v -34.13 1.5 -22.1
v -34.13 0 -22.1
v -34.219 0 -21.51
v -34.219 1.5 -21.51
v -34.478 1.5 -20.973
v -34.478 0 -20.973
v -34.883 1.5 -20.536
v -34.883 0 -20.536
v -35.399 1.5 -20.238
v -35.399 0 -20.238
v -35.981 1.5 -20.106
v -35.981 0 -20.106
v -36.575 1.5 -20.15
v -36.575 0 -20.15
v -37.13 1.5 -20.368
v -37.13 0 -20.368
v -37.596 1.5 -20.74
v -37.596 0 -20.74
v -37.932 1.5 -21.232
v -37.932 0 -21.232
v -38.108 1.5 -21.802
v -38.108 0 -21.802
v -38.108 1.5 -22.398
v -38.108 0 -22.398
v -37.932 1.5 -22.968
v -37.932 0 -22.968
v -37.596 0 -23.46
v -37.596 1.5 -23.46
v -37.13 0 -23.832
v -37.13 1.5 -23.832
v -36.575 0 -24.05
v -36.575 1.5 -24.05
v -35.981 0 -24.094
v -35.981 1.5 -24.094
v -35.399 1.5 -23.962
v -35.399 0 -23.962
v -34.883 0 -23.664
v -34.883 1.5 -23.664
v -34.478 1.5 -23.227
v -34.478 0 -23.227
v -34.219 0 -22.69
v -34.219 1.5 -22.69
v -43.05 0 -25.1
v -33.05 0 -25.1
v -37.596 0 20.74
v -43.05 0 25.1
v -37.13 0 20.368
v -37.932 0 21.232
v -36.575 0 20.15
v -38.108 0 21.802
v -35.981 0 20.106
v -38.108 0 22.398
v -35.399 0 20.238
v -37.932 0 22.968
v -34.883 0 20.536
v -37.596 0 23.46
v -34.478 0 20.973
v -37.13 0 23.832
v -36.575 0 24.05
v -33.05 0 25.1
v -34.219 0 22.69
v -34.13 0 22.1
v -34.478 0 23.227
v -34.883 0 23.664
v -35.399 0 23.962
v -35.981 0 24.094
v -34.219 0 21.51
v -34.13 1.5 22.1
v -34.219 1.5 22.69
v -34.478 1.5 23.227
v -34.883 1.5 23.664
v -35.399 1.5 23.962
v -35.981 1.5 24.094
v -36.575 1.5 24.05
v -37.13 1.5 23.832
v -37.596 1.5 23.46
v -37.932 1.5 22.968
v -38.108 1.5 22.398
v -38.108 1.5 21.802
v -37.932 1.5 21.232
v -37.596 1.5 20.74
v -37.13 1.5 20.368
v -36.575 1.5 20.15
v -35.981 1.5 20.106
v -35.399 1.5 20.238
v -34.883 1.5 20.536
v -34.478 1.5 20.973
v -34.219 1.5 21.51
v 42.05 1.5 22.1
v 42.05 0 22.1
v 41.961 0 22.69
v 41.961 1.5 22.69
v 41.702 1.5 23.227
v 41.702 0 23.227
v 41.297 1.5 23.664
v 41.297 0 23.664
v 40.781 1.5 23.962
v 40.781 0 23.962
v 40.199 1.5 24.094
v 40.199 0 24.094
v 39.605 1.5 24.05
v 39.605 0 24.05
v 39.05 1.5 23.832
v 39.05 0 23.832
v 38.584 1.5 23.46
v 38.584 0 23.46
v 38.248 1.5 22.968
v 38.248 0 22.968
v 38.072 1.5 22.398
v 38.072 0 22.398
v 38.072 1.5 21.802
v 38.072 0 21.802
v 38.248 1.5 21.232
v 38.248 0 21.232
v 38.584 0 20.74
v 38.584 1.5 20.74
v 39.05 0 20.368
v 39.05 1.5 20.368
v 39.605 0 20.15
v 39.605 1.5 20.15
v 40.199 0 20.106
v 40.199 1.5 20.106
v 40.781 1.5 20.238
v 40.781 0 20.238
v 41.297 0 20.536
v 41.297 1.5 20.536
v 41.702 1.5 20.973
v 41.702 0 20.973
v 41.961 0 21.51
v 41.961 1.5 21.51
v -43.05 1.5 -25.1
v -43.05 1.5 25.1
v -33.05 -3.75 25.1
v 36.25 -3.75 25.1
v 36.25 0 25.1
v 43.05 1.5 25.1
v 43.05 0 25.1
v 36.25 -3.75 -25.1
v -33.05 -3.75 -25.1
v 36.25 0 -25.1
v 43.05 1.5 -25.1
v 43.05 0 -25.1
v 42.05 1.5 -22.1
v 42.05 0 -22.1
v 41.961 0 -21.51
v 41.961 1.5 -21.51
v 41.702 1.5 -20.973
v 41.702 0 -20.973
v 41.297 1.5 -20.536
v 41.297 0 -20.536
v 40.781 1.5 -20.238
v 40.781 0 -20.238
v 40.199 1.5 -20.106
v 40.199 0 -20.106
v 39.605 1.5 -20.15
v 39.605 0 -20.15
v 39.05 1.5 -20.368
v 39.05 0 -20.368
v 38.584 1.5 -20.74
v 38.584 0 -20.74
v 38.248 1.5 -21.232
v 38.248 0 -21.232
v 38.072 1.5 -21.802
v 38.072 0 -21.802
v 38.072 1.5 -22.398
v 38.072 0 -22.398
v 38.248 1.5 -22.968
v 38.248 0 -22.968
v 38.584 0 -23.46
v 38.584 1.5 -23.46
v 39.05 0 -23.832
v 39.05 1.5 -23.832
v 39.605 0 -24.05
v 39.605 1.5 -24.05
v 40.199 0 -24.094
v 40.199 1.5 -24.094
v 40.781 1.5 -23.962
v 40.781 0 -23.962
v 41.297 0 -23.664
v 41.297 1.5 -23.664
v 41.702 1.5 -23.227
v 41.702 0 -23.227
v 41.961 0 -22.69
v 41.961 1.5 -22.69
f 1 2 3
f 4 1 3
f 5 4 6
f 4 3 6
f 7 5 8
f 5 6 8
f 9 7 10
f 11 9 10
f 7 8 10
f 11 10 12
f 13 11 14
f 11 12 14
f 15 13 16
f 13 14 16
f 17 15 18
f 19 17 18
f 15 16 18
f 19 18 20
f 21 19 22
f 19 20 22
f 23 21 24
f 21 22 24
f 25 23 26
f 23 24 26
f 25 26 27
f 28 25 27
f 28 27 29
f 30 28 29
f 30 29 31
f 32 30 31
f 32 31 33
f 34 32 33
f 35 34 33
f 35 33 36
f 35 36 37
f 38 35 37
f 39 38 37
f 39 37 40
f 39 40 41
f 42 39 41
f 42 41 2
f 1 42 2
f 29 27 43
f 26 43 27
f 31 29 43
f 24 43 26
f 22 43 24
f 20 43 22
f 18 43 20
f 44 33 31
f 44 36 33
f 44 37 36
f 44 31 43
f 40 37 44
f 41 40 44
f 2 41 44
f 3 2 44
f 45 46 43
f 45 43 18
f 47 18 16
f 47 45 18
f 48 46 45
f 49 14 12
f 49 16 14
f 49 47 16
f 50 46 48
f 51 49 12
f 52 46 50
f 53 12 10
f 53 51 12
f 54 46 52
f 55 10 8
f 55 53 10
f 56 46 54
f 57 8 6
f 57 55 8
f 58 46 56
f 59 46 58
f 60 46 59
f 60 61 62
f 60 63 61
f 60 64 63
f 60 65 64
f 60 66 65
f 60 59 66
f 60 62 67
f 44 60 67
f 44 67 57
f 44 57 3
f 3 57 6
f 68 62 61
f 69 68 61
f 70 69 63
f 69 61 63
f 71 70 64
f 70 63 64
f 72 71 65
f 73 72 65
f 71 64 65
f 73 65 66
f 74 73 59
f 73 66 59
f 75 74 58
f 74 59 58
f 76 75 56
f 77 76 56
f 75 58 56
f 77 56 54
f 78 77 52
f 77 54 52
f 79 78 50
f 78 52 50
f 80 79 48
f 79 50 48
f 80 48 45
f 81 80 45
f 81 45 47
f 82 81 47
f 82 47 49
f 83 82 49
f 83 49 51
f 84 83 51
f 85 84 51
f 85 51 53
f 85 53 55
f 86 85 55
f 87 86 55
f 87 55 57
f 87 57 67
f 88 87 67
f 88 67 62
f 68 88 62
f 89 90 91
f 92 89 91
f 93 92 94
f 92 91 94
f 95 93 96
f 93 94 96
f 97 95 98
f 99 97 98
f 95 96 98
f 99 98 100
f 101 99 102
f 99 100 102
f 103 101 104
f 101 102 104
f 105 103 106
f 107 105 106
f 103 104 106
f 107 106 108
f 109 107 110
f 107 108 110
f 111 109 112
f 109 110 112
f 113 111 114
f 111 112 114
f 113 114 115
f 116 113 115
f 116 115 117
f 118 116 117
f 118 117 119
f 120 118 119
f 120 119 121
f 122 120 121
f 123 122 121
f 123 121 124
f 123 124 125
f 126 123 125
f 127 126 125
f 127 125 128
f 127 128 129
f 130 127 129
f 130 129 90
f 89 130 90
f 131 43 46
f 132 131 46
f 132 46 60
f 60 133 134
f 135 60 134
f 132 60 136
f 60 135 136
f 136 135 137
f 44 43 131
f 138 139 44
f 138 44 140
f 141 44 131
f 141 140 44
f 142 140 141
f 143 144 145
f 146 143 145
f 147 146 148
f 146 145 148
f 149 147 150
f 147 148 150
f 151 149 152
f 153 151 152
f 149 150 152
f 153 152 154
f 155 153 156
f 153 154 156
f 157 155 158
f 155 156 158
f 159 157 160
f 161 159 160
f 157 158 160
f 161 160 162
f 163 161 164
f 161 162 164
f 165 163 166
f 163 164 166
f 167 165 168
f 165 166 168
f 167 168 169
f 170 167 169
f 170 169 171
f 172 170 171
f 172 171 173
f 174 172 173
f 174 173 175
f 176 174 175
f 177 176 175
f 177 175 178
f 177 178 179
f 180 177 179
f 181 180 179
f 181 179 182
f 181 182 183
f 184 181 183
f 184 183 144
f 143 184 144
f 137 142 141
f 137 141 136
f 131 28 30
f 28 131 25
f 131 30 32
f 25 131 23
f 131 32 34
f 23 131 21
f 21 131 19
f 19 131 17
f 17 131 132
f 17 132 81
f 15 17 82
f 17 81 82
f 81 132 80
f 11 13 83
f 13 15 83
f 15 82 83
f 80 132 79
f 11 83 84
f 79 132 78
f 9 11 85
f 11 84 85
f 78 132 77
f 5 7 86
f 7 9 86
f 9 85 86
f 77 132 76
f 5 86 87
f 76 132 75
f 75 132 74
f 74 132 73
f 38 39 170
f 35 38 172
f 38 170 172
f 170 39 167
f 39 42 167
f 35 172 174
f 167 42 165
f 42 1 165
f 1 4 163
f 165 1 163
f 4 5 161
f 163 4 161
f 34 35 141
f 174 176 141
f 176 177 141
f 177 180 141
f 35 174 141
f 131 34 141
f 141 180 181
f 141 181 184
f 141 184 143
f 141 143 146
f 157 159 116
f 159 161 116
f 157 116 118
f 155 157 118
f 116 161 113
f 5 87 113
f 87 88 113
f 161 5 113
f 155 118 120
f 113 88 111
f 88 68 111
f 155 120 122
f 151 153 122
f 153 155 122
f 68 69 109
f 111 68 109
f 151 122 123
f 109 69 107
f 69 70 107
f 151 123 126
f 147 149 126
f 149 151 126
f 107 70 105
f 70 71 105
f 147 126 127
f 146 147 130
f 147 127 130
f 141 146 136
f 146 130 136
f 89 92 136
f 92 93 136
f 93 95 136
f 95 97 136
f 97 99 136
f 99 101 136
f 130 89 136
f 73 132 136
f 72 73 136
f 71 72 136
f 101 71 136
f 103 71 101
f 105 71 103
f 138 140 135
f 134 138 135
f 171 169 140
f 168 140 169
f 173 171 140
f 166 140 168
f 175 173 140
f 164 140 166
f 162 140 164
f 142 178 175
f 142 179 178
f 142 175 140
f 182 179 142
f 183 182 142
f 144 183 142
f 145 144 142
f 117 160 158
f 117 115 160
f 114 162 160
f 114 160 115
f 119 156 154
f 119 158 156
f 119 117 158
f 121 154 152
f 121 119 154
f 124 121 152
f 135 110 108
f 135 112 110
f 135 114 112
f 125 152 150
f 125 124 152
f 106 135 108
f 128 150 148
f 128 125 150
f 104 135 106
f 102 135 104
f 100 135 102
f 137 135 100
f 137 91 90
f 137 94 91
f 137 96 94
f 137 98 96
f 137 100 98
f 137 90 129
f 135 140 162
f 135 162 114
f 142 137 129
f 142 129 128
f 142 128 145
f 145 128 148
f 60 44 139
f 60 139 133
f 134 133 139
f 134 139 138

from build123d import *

# Parameters (mm, degrees)
F0_W     = 86.1
F0_H     = 50.2
F1_DEPTH = 1.5
F2_W     = 69.3
F2_H     = 50.2
F3_DEPTH = 3.75
F4_R     = 2
F5_DEPTH = 1.501


with BuildPart() as f1:
    # F0 (on Front) → F1 (new body)
    with BuildSketch(Plane.XZ):
        Rectangle(F0_W, F0_H)
    extrude(amount=-F1_DEPTH)

    # F2 (on Front) → F3 (join)
    with BuildSketch(Plane.XZ):
        with Locations((1.6, 0)):
            Rectangle(F2_W, F2_H)
    extrude(amount=F3_DEPTH)

    # F4 (on Front) → F5 (cut, through all)
    with BuildSketch(Plane.XZ):
        with Locations((-36.13, 22.1)):
            Circle(F4_R)
        with Locations((-36.13, -22.1)):
            Circle(F4_R)
        with Locations((40.05, 22.1)):
            Circle(F4_R)
        with Locations((40.05, -22.1)):
            Circle(F4_R)
    extrude(amount=-F5_DEPTH, mode=Mode.SUBTRACT)


solid = f1.part
